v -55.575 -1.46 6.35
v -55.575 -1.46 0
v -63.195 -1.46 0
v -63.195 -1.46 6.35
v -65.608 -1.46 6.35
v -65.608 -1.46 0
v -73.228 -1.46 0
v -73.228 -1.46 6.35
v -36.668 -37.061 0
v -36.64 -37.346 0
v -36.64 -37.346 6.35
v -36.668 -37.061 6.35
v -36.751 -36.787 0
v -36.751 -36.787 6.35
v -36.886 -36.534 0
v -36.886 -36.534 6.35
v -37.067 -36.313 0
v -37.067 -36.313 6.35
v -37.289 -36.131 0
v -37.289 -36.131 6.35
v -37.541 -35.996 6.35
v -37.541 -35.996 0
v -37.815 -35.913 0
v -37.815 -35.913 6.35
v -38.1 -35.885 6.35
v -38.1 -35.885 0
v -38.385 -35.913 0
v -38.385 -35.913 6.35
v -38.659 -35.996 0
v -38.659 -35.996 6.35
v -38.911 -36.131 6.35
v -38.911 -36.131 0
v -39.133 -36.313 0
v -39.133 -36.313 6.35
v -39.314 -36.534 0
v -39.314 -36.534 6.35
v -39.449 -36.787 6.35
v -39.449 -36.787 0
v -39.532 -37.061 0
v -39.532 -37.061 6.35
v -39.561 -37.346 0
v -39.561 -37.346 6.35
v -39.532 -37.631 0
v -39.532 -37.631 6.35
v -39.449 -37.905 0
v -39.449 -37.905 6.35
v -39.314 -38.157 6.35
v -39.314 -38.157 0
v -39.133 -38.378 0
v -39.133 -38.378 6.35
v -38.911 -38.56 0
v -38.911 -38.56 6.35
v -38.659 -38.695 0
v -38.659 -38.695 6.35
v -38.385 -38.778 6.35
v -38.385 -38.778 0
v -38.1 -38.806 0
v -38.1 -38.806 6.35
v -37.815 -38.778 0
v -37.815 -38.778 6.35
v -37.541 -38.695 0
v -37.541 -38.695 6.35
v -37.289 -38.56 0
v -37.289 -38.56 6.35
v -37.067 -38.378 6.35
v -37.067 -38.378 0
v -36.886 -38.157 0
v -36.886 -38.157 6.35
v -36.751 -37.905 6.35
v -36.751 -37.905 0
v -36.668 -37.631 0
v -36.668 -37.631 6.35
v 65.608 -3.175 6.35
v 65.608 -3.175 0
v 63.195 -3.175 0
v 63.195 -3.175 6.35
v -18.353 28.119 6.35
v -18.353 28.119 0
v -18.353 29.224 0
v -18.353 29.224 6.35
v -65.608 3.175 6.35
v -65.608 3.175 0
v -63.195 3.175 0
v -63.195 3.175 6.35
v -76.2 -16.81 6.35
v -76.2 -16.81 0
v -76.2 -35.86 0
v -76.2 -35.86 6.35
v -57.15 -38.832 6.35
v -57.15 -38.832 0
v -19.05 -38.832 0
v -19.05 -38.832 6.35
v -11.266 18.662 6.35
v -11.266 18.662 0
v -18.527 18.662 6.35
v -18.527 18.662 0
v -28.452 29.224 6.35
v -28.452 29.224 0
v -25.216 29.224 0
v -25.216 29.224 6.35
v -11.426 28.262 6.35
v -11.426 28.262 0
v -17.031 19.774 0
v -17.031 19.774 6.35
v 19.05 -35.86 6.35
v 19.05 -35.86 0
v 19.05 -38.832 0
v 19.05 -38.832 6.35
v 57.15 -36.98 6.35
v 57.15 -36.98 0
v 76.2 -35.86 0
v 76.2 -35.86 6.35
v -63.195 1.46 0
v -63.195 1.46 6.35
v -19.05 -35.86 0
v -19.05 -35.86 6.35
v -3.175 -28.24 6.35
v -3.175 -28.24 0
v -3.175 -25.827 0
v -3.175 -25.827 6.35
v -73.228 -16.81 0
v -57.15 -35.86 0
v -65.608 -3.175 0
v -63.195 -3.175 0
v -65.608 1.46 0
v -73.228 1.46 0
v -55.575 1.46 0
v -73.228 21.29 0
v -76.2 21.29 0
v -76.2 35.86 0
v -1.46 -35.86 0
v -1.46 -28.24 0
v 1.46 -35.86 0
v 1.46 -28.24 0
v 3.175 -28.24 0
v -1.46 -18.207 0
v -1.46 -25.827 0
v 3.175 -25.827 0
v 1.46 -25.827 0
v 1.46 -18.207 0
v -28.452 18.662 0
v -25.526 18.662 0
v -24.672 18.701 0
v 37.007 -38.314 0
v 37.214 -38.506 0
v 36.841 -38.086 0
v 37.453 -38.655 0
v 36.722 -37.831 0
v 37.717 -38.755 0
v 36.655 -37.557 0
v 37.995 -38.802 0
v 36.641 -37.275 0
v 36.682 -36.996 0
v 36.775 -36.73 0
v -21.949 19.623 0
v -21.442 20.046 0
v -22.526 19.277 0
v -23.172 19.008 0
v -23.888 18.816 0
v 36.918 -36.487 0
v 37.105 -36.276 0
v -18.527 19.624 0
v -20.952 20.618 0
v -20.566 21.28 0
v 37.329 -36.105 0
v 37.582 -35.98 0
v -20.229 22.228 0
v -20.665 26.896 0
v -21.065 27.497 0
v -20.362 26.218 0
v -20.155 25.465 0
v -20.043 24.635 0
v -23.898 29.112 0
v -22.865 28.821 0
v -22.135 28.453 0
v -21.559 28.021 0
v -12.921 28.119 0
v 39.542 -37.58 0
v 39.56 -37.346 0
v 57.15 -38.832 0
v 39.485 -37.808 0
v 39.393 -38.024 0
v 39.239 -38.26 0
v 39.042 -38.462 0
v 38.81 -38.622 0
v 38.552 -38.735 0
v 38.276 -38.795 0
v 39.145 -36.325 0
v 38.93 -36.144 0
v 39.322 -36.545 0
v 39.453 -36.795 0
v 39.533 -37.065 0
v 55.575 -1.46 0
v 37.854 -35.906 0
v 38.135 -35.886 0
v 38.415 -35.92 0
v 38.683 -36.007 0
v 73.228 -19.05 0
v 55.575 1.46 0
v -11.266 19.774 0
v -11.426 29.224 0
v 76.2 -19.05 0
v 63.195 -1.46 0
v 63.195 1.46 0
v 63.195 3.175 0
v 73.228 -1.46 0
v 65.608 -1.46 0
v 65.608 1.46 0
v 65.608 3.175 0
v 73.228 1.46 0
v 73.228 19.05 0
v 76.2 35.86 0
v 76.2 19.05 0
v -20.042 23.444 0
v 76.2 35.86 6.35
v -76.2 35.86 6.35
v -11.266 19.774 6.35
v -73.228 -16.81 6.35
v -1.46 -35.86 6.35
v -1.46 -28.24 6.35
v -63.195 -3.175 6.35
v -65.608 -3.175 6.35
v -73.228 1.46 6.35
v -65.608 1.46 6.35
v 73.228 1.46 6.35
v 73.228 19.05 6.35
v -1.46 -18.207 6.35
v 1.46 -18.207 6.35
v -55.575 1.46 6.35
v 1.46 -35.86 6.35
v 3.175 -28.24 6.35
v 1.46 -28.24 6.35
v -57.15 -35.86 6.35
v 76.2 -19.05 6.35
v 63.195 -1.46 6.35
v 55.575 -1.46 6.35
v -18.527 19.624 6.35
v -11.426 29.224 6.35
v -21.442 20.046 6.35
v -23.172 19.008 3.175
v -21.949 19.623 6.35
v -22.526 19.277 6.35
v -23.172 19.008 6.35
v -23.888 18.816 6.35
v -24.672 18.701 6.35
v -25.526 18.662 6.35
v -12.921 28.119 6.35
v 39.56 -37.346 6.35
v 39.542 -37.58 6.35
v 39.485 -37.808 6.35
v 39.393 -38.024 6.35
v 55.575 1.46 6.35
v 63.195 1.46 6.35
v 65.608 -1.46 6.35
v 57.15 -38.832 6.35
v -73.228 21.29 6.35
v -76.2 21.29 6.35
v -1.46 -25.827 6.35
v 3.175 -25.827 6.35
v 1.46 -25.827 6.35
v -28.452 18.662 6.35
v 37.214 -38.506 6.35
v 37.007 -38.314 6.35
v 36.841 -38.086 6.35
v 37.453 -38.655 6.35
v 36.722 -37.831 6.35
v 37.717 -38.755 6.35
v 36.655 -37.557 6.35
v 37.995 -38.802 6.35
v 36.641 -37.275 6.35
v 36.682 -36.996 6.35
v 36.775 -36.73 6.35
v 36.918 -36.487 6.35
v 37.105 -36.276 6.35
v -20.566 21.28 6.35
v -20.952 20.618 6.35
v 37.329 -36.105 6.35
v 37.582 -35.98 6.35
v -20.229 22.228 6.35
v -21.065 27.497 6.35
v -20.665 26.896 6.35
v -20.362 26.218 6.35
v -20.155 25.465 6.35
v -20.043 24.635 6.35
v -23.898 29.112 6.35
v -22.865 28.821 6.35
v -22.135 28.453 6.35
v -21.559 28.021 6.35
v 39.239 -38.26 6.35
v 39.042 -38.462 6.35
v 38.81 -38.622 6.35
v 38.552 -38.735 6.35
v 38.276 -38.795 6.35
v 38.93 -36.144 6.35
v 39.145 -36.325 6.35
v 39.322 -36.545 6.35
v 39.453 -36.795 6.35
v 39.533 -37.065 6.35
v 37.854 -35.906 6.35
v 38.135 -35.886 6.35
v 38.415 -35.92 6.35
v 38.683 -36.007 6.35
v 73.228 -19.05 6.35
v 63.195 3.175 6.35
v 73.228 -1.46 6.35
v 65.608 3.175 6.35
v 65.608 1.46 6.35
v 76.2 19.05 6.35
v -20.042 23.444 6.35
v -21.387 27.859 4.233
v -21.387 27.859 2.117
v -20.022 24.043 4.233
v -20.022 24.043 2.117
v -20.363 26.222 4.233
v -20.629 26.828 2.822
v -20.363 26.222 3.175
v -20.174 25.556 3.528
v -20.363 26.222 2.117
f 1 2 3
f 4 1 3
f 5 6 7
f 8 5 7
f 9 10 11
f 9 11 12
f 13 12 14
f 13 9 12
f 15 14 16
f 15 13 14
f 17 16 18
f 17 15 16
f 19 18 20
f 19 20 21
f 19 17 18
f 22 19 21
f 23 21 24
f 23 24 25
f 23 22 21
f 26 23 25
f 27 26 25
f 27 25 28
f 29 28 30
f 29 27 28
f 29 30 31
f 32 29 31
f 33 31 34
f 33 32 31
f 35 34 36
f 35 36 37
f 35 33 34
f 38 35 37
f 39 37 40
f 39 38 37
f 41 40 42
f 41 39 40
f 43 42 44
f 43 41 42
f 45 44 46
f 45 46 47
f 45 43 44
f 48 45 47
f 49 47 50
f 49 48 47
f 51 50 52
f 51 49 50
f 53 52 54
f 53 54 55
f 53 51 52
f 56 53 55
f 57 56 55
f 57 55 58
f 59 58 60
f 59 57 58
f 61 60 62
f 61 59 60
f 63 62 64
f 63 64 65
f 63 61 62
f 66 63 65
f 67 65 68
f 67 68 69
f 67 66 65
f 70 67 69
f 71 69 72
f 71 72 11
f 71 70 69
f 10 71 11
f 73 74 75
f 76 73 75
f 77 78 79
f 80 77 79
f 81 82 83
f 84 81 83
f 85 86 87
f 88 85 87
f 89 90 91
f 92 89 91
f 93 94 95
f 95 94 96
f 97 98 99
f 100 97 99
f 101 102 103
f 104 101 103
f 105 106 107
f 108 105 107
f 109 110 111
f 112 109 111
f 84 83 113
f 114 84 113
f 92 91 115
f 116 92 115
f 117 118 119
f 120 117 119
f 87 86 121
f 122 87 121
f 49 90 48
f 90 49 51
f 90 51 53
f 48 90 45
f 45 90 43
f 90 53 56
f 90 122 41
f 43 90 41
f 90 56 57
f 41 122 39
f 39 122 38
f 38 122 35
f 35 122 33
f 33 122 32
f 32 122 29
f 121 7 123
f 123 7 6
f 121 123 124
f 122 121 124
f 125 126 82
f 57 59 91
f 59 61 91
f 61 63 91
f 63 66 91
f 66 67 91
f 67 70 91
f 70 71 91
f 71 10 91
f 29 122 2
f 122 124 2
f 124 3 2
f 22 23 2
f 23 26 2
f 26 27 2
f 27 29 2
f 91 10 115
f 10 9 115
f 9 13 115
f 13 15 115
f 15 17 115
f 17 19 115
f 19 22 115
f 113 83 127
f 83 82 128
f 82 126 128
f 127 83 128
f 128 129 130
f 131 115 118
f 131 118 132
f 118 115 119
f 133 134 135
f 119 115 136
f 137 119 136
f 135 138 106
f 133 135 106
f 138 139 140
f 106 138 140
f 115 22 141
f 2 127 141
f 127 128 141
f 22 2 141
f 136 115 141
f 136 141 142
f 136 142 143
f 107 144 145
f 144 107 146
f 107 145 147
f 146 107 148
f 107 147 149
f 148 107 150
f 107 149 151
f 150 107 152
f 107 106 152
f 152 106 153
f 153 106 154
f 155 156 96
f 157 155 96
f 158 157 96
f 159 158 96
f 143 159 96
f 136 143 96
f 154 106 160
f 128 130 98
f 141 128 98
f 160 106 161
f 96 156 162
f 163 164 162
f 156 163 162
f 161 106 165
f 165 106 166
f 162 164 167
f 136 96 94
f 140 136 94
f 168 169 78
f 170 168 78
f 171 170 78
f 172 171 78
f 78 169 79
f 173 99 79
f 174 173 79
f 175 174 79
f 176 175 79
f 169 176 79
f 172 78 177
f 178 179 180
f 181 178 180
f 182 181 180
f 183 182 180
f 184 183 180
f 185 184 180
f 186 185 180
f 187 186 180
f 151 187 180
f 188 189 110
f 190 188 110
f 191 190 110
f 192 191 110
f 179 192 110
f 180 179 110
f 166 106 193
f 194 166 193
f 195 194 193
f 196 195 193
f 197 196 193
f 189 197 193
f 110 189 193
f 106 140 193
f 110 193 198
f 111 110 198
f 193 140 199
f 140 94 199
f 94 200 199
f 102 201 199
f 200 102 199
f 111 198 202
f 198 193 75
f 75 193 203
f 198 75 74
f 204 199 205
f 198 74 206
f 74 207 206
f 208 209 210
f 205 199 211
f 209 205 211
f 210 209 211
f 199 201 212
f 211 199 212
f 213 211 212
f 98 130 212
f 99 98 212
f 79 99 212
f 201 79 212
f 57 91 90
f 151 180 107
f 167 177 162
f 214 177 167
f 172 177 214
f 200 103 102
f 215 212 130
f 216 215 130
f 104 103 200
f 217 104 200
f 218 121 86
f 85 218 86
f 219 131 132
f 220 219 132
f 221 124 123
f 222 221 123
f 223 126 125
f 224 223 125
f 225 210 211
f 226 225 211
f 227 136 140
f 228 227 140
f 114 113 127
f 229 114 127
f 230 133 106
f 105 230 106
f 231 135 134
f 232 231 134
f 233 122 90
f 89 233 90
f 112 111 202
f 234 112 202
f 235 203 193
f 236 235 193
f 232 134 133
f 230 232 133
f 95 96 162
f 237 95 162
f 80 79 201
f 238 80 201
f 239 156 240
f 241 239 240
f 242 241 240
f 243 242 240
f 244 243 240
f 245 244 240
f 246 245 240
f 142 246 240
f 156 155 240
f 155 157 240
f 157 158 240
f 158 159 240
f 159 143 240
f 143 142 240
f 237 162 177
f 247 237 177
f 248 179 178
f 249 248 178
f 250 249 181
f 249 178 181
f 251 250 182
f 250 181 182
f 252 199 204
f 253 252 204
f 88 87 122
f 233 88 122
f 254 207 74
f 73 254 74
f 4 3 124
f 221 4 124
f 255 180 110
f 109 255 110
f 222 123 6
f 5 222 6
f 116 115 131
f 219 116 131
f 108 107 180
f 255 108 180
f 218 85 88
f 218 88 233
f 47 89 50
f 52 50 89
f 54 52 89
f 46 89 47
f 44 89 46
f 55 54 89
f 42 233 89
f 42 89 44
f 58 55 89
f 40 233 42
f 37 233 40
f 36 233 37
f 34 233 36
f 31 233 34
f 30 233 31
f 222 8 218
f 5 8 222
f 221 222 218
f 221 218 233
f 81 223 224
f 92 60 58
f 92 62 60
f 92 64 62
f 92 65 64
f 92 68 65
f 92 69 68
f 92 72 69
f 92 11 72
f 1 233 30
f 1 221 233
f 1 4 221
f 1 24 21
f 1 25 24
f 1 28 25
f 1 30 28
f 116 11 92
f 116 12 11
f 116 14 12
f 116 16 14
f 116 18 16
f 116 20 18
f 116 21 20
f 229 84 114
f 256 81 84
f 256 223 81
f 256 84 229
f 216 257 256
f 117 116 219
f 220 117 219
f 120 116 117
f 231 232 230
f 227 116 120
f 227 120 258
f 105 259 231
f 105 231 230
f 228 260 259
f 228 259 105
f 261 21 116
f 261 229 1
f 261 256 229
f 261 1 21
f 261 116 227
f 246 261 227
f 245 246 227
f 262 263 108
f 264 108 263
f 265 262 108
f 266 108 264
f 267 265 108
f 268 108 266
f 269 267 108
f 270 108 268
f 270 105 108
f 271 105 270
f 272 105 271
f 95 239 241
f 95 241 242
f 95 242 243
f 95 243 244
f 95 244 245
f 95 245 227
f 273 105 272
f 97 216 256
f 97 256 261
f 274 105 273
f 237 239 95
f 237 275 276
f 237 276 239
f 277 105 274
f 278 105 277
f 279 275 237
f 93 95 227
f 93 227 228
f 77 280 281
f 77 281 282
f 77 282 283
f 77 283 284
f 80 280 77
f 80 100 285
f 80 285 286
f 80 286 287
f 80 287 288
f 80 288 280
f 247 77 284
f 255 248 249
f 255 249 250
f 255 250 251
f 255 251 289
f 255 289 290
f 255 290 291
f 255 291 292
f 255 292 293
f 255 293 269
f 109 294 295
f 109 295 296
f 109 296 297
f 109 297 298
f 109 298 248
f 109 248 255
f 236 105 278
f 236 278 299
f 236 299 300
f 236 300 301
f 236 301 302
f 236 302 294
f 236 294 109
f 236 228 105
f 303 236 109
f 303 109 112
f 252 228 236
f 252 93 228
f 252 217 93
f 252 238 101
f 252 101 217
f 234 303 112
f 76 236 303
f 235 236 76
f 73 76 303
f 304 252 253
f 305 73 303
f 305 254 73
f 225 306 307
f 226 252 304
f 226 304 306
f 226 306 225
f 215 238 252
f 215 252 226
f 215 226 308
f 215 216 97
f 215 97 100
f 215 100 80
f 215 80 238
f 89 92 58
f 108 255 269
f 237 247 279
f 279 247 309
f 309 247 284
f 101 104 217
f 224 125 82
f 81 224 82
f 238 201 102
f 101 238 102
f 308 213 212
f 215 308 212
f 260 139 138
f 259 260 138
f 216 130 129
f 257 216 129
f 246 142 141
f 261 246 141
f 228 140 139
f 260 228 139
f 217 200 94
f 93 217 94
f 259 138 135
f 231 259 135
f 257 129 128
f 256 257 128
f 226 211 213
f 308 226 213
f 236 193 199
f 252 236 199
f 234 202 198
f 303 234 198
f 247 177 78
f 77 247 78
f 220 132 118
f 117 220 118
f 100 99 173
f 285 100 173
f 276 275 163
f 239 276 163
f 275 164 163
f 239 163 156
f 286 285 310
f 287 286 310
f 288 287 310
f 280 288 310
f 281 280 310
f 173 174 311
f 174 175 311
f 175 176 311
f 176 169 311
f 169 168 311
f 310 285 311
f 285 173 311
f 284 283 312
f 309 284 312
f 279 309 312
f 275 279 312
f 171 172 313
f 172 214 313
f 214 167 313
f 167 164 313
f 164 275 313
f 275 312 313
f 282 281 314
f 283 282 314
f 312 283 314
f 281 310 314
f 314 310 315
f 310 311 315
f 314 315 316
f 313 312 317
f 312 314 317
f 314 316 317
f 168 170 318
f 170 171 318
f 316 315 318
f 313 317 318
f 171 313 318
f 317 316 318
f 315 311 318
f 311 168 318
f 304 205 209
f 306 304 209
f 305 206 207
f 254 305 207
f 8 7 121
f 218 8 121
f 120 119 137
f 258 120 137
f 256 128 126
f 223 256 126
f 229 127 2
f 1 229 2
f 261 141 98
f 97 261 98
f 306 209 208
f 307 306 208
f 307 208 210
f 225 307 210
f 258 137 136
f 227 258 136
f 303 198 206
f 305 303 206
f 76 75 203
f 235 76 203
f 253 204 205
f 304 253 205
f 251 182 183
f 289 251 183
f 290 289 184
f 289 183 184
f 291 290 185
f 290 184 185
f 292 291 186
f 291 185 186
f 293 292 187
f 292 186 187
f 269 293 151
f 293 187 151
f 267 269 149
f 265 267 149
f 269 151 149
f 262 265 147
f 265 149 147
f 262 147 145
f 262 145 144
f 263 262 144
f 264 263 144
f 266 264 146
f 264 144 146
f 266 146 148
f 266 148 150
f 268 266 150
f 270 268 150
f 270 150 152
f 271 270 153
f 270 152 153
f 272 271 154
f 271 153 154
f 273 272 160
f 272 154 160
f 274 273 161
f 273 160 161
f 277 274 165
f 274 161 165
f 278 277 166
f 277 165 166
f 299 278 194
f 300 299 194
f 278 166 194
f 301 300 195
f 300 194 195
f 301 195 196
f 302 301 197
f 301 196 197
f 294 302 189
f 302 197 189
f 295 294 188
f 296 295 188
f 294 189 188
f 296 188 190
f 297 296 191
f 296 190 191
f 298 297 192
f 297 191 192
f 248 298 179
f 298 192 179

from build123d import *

# Parameters (mm, degrees)
F0_R     = 1.4605
F1_DEPTH = 6.35


# Not quite as in the source:
# - a feature names something its author has since deleted; it is built from what else it names


with BuildPart() as f1:
    # F0 (on Top) → F1 (new body)
    with BuildSketch(Plane.XY):
        Polygon((76.2, 19.05), (76.2, 35.8597988734), (-76.2, 35.8597988734), (-76.2, 21.2902011266), (-73.2282, 21.2902011266), (-73.2282, 1.4605), (-65.6082, 1.4605), (-65.6082, 3.175), (-63.1952, 3.175), (-63.1952, 1.4605), (-55.5752, 1.4605), (-55.5752, -1.4605), (-63.1952, -1.4605), (-63.1952, -3.175), (-65.6082, -3.175), (-65.6082, -1.4605), (-73.2282, -1.4605), (-73.2282, -16.8097988734), (-76.2, -16.8097988734), (-76.2, -35.8597988734), (-57.15, -35.8597988734), (-57.15, -38.8315988734), (-19.05, -38.8315988734), (-19.05, -35.8597988734), (-1.4605, -35.8597988734), (-1.4605, -28.2397988734), (-3.175, -28.2397988734), (-3.175, -25.8267988734), (-1.4605, -25.8267988734), (-1.4605, -18.2067988734), (1.4605, -18.2067988734), (1.4605, -25.8267988734), (3.175, -25.8267988734), (3.175, -28.2397988734), (1.4605, -28.2397988734), (1.4605, -35.8597988734), (19.05, -35.8597988734), (19.05, -38.8315988734), (57.15, -38.8315988734), (57.15, -36.9798994367), (57.15, -35.8597988734), (76.2, -35.8597988734), (76.2, -19.05), (73.2282, -19.05), (73.2282, -1.4605), (65.6082, -1.4605), (65.6082, -3.175), (63.1952, -3.175), (63.1952, -1.4605), (55.5752, -1.4605), (55.5752, 1.4605), (63.1952, 1.4605), (63.1952, 3.175), (65.6082, 3.175), (65.6082, 1.4605), (73.2282, 1.4605), (73.2282, 19.05), align=None)
        with Locations((-38.1, -37.3456988734)):
            Circle(F0_R, mode=Mode.SUBTRACT)
        with BuildLine():
            ThreePointArc((39.5605, -37.3456988734), (39.5181253393, -37.6949563314), (39.3934602575, -38.0239472145))
            ThreePointArc((39.3934602575, -38.0239472145), (36.6818746607, -36.9964414154), (39.5605, -37.3456988734))
        make_face(mode=Mode.SUBTRACT)
        with BuildLine():
            add(Edge.make_bspline(
                [(-21.3872035351, 27.8586064071), (-20.0222567073, 26.4936595793), (-20.0222567073, 24.0434586691)],
                knots=[0, 0, 0, 1, 1, 1], degree=2))
            add(Edge.make_bspline(
                [(-20.0222567073, 24.0434586691), (-20.0222567073, 21.4291405282), (-21.441524027, 20.0457016181)],
                knots=[0, 0, 0, 1, 1, 1], degree=2))
            add(Edge.make_bspline(
                [(-21.441524027, 20.0457016181), (-22.8607913466, 18.6622627079), (-25.525962714, 18.6622627079)],
                knots=[0, 0, 0, 1, 1, 1], degree=2))
            Line((-25.525962714, 18.6622627079), (-28.4523347444, 18.6622627079))
            Line((-28.4523347444, 18.6622627079), (-28.4523347444, 29.2235532349))
            Line((-28.4523347444, 29.2235532349), (-25.2162203348, 29.2235532349))
            add(Edge.make_bspline(
                [(-25.2162203348, 29.2235532349), (-22.7521503629, 29.2235532349), (-21.3872035351, 27.8586064071)],
                knots=[0, 0, 0, 1, 1, 1], degree=2))
        make_face(mode=Mode.SUBTRACT)
        Polygon((-11.2662557189, 19.7740991587), (-11.2662557189, 18.6622627079), (-18.526709548, 18.6622627079), (-18.526709548, 19.6238509897), (-12.9212970884, 28.118651315), (-18.353346276, 28.118651315), (-18.353346276, 29.2235532349), (-11.4257499291, 29.2235532349), (-11.4257499291, 28.2619649531), (-17.0311623887, 19.7740991587), align=None, mode=Mode.SUBTRACT)
        Polygon((57.15, -36.9798994367), (76.2, -35.8597988734), (57.15, -35.8597988734), align=None)
    extrude(amount=F1_DEPTH)


solid = f1.part
